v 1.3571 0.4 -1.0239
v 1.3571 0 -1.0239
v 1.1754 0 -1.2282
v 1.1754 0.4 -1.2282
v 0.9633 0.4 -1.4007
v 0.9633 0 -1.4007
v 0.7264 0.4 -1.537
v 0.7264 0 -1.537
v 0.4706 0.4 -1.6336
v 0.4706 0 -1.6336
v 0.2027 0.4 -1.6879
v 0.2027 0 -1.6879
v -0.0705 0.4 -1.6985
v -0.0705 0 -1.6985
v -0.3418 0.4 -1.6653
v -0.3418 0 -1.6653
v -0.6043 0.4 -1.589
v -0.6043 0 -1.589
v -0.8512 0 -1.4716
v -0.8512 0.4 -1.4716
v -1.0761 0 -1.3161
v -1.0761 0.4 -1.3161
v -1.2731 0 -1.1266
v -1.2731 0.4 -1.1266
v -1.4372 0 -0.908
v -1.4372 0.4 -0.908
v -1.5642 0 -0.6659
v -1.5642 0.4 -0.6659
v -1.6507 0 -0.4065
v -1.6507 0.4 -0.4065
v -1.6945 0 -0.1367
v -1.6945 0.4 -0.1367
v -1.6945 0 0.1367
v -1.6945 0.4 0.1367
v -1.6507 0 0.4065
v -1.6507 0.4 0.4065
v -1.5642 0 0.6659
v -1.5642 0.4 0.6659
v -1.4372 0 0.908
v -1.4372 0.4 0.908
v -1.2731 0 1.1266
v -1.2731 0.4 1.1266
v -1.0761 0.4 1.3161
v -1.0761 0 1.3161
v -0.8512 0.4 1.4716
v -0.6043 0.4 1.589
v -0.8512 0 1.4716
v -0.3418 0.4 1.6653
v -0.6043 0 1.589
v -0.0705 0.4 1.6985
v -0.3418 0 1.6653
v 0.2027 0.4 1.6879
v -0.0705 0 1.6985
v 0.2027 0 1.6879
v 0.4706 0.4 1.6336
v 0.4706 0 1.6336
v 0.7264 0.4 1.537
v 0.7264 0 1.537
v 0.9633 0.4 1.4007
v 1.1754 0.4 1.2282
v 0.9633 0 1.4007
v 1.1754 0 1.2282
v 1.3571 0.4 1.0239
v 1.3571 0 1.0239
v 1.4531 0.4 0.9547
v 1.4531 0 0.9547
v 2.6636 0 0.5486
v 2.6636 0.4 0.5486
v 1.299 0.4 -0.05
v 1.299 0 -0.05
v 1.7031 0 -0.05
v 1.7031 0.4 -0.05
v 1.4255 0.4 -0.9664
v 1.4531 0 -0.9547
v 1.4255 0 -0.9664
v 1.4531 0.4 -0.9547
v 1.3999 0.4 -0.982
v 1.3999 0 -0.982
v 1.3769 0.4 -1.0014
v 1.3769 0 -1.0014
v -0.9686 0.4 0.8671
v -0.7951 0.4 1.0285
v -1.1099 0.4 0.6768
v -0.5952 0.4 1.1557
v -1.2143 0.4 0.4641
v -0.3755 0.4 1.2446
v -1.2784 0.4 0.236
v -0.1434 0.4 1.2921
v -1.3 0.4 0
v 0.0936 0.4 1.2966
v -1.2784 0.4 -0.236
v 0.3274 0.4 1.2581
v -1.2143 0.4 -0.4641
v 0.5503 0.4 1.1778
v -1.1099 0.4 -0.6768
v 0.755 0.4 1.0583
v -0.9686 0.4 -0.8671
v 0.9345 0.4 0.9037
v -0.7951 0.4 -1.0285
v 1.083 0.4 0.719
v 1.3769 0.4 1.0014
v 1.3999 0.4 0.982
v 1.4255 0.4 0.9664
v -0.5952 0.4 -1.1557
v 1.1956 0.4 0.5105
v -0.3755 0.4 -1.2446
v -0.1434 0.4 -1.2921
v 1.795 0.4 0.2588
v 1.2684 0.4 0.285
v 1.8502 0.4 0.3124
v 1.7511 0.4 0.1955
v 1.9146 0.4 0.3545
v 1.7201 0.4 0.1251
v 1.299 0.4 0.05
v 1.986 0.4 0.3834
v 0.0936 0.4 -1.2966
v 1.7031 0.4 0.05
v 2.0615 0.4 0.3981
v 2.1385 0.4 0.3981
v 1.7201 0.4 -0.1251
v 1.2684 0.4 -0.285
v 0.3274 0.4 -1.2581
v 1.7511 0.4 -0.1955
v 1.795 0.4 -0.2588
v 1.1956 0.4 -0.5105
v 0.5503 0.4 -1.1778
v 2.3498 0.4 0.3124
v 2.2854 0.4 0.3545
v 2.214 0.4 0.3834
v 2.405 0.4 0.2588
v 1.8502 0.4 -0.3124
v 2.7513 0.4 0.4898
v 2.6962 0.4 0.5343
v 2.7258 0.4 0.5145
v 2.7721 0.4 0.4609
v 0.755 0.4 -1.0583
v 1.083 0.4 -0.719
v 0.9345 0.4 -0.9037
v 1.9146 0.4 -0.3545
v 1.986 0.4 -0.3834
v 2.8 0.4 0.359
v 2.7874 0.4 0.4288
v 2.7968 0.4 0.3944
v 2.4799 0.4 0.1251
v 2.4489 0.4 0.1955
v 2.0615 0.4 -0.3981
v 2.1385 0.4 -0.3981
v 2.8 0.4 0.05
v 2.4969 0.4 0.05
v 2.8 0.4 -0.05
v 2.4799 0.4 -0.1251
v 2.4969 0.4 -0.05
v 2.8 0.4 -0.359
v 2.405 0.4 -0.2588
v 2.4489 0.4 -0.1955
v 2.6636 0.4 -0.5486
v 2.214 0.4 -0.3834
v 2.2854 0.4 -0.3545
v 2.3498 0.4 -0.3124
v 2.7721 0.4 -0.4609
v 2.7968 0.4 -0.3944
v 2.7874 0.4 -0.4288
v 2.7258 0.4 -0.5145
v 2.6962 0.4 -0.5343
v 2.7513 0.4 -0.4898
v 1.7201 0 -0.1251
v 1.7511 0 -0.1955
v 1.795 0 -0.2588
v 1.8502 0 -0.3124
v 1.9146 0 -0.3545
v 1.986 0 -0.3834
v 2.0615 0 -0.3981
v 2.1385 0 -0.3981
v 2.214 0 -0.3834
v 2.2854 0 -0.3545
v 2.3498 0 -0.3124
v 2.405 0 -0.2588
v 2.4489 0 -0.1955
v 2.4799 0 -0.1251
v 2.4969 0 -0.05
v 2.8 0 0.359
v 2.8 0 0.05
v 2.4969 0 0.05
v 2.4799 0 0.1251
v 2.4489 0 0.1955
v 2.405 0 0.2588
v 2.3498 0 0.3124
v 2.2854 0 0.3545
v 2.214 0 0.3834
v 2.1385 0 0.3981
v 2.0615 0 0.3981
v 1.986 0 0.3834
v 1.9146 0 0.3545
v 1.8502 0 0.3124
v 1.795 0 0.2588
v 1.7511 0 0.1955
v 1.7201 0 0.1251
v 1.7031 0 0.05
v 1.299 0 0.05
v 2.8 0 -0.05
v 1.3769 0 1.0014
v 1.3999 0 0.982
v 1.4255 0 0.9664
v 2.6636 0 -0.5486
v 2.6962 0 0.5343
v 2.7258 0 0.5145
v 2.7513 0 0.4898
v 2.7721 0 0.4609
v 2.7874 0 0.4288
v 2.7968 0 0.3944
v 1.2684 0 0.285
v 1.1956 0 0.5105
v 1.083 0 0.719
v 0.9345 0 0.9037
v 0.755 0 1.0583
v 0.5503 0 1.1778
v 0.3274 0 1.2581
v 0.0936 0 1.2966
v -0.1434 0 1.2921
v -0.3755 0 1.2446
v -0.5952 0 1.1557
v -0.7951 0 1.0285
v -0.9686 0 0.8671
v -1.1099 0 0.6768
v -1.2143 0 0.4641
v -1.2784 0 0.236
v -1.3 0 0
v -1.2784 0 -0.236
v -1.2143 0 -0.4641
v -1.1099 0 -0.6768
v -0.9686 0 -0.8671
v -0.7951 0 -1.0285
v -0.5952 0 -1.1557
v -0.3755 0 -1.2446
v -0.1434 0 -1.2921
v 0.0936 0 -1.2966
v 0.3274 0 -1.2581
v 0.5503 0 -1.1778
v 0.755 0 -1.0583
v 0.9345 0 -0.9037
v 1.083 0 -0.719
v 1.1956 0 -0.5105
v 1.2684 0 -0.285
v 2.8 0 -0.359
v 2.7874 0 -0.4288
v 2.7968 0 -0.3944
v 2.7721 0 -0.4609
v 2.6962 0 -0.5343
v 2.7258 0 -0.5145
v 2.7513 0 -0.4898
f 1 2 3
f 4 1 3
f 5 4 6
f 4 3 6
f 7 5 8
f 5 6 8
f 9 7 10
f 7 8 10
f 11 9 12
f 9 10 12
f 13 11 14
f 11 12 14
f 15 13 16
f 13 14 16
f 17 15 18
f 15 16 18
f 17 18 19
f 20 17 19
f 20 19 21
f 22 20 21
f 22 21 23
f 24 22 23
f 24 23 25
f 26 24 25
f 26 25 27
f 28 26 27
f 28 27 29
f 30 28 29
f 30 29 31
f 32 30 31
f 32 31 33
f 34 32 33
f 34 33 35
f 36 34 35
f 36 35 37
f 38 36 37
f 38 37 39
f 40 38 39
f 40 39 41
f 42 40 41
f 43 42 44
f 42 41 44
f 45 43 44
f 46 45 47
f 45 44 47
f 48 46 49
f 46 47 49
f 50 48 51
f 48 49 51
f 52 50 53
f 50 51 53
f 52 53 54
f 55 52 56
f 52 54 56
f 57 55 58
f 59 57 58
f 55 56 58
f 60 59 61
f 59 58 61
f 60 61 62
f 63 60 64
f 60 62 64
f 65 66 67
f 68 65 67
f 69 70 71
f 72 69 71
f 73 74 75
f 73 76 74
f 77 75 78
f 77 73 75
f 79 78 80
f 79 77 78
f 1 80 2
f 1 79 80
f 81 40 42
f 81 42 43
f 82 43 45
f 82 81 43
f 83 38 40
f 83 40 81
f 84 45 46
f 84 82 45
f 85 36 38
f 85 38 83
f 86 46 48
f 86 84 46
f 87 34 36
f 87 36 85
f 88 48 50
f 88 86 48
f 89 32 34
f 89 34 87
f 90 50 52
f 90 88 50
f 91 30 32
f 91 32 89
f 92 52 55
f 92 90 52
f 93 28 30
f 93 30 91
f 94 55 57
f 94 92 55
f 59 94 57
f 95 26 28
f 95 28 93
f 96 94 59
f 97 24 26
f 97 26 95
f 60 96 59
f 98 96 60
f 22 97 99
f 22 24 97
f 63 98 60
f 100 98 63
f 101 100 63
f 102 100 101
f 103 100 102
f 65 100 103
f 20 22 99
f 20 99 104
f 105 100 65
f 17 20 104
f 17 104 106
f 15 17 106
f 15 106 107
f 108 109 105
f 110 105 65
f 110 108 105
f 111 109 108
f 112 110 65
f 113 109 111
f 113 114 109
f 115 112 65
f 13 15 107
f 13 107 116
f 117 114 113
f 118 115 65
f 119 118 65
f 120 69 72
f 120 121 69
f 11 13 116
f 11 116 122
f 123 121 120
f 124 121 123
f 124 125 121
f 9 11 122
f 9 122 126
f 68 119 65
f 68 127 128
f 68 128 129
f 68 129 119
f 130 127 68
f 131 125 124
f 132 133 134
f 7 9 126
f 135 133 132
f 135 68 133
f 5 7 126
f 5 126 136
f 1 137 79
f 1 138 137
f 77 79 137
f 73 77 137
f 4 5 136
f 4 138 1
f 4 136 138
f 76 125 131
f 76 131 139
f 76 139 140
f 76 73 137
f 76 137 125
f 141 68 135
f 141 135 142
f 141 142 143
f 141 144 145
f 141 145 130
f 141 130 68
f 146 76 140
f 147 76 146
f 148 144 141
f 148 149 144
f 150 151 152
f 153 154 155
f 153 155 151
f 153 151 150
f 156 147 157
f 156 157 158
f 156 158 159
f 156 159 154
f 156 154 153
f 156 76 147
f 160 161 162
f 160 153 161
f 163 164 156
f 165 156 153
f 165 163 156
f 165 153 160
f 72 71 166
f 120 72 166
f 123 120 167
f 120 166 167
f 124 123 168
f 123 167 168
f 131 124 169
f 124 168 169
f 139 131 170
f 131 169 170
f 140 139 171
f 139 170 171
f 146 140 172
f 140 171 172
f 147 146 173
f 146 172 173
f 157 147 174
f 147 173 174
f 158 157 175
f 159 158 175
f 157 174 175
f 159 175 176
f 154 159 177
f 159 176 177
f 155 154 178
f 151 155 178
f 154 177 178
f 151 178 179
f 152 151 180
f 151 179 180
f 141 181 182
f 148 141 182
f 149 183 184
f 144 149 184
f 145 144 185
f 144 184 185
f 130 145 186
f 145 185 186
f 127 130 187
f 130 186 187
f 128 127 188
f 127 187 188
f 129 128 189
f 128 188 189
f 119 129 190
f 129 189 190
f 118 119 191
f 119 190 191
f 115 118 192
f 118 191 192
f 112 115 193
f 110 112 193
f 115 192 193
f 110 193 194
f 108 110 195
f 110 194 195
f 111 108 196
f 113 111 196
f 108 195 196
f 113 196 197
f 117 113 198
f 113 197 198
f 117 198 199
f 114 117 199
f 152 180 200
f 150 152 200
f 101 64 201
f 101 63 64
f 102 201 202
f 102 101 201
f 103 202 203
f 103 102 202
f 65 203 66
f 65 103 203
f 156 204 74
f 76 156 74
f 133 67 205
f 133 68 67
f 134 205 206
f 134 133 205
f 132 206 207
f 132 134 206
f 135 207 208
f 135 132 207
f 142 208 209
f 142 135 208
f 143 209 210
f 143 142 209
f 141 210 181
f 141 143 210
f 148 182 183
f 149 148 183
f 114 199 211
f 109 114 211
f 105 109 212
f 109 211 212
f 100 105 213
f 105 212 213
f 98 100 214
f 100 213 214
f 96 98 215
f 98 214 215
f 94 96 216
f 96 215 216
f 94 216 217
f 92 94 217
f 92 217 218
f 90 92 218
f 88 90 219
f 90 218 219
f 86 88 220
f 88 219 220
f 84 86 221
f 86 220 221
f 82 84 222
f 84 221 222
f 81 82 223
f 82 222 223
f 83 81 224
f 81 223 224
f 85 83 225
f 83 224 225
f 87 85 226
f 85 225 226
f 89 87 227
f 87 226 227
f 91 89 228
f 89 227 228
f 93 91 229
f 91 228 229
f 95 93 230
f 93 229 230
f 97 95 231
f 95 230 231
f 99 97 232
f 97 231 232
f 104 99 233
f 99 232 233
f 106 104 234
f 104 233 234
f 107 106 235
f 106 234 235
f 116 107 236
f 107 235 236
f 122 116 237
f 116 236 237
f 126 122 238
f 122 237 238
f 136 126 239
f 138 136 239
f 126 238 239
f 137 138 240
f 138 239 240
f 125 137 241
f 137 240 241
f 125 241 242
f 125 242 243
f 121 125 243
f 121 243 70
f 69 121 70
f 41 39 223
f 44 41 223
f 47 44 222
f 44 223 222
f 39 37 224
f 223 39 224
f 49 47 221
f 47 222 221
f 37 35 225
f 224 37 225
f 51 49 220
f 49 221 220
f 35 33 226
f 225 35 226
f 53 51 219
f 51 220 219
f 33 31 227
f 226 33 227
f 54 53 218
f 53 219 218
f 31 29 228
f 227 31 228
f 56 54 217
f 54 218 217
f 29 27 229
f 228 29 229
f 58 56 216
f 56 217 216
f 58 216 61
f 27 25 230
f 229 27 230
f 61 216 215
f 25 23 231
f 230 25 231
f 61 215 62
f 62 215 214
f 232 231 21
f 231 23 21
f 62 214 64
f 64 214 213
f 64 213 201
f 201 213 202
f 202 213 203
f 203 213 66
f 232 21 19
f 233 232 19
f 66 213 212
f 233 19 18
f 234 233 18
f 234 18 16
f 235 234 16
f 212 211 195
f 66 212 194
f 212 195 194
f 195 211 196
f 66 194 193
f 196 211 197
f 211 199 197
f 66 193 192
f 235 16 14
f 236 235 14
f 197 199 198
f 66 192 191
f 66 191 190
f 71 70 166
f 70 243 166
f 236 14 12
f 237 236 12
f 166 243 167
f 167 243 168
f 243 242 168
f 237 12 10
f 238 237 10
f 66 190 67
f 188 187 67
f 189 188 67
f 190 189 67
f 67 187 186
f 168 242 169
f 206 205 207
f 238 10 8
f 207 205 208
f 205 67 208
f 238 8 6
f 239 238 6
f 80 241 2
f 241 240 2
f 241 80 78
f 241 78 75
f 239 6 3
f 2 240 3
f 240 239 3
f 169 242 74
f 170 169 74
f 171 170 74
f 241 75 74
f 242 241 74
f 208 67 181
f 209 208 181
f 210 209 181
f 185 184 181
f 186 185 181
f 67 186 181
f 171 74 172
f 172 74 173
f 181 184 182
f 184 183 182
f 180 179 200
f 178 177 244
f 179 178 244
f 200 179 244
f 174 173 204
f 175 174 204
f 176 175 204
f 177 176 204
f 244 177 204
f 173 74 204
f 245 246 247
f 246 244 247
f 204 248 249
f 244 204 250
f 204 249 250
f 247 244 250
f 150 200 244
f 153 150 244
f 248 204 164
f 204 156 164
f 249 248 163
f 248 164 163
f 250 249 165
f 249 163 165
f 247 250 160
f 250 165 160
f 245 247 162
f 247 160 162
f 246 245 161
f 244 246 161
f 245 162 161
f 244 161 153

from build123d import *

# Parameters (mm, degrees)
BOSS_EXTRUDE1_DEPTH = 0.4
FILLET1_R           = 0.2


with BuildPart() as part:
    # Sketch1 → Boss-Extrude1 (new body)
    with BuildSketch(Plane(origin=(0, 0, 0), x_dir=(1, 0, 0), z_dir=(0, 1, 0))):
        with BuildLine():
            Line((2.8, 0.5028522), (1.392584, 0.975043488))
            ThreePointArc((1.392584, 0.975043488), (-1.7, 0), (1.392584, -0.975043488))
            Line((1.392584, -0.975043488), (2.8, -0.5028522))
            Line((2.8, -0.5028522), (2.8, -0.05))
            Line((2.8, -0.05), (2.496862697, -0.05))
            ThreePointArc((2.496862697, -0.05), (2.1, -0.4), (1.703137303, -0.05))
            Line((1.703137303, -0.05), (1.299038106, -0.05))
            ThreePointArc((1.299038106, -0.05), (-1.3, 0), (1.299038106, 0.05))
            Line((1.299038106, 0.05), (1.703137303, 0.05))
            ThreePointArc((1.703137303, 0.05), (2.1, 0.4), (2.496862697, 0.05))
            Line((2.496862697, 0.05), (2.8, 0.05))
            Line((2.8, 0.05), (2.8, 0.5028522))
        make_face()
    extrude(amount=BOSS_EXTRUDE1_DEPTH)

    # Fillet1
    fillet1_edges = [part.edges().sort_by_distance(p)[0] for p in [
        (2.8, 0.2, 0.5028522),
        (1.392584, 0.2, 0.975043488),
        (1.392584, 0.2, -0.975043488),
        (2.8, 0.2, -0.5028522),
    ]]
    fillet(fillet1_edges, radius=FILLET1_R)


solid = part.part
